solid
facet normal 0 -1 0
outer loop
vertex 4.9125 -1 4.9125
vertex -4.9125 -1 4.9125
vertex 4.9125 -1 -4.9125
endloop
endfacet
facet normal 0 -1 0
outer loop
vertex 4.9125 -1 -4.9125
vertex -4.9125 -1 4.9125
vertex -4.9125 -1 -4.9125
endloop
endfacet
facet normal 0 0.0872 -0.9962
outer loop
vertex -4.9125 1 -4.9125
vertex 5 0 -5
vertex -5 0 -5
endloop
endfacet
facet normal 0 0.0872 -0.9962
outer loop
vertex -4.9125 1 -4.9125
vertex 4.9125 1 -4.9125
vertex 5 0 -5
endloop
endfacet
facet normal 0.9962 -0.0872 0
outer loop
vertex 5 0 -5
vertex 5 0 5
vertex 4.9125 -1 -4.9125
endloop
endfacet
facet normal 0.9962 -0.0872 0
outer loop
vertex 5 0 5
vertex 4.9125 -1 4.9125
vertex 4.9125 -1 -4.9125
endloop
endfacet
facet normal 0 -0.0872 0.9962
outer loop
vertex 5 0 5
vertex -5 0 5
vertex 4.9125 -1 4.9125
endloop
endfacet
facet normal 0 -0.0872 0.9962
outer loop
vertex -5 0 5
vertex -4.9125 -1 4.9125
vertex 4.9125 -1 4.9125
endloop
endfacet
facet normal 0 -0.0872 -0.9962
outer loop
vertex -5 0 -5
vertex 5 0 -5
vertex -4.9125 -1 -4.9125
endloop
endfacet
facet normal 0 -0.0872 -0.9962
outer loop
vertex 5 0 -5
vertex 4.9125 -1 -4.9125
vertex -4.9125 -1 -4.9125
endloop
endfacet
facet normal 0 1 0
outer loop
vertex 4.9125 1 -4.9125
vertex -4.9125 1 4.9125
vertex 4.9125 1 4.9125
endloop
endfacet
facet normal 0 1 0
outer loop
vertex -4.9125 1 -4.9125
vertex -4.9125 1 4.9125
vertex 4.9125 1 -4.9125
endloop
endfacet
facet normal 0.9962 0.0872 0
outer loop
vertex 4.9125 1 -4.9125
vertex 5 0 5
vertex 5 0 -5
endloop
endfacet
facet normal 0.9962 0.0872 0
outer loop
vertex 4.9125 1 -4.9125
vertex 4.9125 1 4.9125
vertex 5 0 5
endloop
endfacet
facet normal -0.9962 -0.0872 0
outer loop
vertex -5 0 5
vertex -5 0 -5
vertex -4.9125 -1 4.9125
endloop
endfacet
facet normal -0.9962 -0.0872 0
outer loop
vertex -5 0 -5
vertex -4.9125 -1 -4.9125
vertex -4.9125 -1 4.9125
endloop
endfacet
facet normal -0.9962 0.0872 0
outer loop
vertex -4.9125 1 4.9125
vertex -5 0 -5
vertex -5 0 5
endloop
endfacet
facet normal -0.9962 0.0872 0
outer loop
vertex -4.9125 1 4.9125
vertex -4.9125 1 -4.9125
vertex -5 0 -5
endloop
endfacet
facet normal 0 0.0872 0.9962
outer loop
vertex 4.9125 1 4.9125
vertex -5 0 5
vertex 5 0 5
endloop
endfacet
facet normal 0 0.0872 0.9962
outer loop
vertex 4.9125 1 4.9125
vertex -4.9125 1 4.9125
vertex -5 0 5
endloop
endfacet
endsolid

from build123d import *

# Parameters (mm, degrees)
SKETCH1_W                     = 10
SKETCH1_H                     = 10
BOSS_EXTRUDE1_DEPTH           = 1
BOSS_EXTRUDE1_TAPER           = 5
BOSS_EXTRUDE1_OTHER_WAY_DEPTH = 1
BOSS_EXTRUDE1_OTHER_WAY_TAPER = 5


with BuildPart() as part:
    # Sketch1 → Boss-Extrude1 (new body)
    with BuildSketch(Plane(origin=(0, 0, 0), x_dir=(1, 0, 0), z_dir=(0, 1, 0))):
        Rectangle(SKETCH1_W, SKETCH1_H)
    extrude(amount=BOSS_EXTRUDE1_DEPTH, taper=BOSS_EXTRUDE1_TAPER)

    # Sketch1 → Boss-Extrude1 other way (add)
    with BuildSketch(Plane(origin=(0, 0, 0), x_dir=(1, 0, 0), z_dir=(0, 1, 0))):
        Rectangle(SKETCH1_W, SKETCH1_H)
    extrude(amount=-BOSS_EXTRUDE1_OTHER_WAY_DEPTH, taper=BOSS_EXTRUDE1_OTHER_WAY_TAPER)


solid = part.part
